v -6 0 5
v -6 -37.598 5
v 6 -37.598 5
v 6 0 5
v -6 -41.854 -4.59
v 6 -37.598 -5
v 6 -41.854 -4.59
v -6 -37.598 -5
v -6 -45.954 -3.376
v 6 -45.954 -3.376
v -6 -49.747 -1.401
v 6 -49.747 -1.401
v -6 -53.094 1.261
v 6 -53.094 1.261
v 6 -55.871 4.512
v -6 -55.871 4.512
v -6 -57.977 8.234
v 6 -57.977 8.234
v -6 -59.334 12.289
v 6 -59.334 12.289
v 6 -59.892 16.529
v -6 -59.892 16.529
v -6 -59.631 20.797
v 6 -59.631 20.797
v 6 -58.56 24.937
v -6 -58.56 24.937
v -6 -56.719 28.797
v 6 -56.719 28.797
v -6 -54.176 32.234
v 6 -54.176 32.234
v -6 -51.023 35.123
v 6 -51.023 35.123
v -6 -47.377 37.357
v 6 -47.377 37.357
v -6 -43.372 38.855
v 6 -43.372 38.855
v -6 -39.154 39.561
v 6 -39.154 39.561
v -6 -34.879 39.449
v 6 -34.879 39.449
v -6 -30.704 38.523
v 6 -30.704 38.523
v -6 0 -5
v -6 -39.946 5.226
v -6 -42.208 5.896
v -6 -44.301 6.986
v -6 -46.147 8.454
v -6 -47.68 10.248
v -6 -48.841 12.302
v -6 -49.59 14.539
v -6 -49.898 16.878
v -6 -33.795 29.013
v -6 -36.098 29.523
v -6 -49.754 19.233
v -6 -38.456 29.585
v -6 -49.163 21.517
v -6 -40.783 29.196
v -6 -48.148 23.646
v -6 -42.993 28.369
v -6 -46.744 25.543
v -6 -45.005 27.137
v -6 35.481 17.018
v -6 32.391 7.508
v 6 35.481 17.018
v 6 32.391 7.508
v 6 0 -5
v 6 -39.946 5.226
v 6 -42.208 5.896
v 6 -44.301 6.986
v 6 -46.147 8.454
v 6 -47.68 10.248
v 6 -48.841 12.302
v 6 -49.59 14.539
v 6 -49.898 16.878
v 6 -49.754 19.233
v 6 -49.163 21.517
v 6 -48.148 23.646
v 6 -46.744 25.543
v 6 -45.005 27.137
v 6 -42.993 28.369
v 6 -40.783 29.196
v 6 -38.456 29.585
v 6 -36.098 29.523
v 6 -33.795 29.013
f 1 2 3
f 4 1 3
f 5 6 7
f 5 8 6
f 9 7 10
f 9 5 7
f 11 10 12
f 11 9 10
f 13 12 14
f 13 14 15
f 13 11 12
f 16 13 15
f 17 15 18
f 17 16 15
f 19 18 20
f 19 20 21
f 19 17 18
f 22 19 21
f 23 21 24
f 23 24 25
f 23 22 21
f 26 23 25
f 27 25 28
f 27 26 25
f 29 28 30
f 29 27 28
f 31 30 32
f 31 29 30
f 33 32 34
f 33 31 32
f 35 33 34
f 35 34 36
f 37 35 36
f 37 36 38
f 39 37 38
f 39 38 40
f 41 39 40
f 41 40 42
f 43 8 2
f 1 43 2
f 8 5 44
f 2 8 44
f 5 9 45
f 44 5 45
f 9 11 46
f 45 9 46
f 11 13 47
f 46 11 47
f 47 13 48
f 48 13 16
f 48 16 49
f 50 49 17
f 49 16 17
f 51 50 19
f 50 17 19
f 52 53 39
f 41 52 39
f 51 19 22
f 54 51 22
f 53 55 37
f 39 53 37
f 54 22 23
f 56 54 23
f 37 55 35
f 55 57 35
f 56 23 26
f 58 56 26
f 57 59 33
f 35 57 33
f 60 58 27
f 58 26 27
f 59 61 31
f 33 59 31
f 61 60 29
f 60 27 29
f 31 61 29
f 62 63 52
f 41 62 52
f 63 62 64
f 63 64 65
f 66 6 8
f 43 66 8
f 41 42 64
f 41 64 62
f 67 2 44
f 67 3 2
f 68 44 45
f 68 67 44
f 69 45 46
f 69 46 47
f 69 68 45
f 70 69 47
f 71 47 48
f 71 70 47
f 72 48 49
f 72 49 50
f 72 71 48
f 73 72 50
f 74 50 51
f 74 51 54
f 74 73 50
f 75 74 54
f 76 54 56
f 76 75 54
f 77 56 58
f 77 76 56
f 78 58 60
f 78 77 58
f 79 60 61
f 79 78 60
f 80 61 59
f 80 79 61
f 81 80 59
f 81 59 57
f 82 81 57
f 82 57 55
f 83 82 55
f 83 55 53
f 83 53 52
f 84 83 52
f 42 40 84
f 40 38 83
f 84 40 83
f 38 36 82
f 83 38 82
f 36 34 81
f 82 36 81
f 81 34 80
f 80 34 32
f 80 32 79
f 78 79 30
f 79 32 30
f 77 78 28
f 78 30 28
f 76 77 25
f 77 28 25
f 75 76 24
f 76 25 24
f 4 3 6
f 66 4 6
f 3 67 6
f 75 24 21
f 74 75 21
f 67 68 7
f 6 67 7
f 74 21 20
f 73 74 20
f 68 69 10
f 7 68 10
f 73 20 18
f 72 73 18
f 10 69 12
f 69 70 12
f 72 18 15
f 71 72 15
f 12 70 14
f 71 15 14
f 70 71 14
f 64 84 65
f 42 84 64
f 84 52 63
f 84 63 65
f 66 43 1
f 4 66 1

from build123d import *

# Parameters (mm, degrees)
ESQUISSE1_W = 12
ESQUISSE1_H = 10


with BuildPart() as part:
    # Balayage1: sweep along a path in Esquisse2
    with BuildLine(Plane(origin=(0, 0, 0), x_dir=(0, 0, -1), z_dir=(1, 0, 0))) as balayage1_path:
        Line((0, 0), (0, -37.597886471))
        ThreePointArc((0, -37.597886471), (-20.015041061, -54.69234646), (-33.767997639, -32.249561064))
        Line((-33.767997639, -32.249561064), (-12.263031239, 33.935919993))
    # Esquisse1 → Balayage1 (sweep)
    with BuildSketch(Plane(origin=(0, 0, 0), x_dir=(1, 0, 0), z_dir=(0, 1, 0))):
        Rectangle(ESQUISSE1_W, ESQUISSE1_H)
    sweep(path=balayage1_path.line)


solid = part.part
